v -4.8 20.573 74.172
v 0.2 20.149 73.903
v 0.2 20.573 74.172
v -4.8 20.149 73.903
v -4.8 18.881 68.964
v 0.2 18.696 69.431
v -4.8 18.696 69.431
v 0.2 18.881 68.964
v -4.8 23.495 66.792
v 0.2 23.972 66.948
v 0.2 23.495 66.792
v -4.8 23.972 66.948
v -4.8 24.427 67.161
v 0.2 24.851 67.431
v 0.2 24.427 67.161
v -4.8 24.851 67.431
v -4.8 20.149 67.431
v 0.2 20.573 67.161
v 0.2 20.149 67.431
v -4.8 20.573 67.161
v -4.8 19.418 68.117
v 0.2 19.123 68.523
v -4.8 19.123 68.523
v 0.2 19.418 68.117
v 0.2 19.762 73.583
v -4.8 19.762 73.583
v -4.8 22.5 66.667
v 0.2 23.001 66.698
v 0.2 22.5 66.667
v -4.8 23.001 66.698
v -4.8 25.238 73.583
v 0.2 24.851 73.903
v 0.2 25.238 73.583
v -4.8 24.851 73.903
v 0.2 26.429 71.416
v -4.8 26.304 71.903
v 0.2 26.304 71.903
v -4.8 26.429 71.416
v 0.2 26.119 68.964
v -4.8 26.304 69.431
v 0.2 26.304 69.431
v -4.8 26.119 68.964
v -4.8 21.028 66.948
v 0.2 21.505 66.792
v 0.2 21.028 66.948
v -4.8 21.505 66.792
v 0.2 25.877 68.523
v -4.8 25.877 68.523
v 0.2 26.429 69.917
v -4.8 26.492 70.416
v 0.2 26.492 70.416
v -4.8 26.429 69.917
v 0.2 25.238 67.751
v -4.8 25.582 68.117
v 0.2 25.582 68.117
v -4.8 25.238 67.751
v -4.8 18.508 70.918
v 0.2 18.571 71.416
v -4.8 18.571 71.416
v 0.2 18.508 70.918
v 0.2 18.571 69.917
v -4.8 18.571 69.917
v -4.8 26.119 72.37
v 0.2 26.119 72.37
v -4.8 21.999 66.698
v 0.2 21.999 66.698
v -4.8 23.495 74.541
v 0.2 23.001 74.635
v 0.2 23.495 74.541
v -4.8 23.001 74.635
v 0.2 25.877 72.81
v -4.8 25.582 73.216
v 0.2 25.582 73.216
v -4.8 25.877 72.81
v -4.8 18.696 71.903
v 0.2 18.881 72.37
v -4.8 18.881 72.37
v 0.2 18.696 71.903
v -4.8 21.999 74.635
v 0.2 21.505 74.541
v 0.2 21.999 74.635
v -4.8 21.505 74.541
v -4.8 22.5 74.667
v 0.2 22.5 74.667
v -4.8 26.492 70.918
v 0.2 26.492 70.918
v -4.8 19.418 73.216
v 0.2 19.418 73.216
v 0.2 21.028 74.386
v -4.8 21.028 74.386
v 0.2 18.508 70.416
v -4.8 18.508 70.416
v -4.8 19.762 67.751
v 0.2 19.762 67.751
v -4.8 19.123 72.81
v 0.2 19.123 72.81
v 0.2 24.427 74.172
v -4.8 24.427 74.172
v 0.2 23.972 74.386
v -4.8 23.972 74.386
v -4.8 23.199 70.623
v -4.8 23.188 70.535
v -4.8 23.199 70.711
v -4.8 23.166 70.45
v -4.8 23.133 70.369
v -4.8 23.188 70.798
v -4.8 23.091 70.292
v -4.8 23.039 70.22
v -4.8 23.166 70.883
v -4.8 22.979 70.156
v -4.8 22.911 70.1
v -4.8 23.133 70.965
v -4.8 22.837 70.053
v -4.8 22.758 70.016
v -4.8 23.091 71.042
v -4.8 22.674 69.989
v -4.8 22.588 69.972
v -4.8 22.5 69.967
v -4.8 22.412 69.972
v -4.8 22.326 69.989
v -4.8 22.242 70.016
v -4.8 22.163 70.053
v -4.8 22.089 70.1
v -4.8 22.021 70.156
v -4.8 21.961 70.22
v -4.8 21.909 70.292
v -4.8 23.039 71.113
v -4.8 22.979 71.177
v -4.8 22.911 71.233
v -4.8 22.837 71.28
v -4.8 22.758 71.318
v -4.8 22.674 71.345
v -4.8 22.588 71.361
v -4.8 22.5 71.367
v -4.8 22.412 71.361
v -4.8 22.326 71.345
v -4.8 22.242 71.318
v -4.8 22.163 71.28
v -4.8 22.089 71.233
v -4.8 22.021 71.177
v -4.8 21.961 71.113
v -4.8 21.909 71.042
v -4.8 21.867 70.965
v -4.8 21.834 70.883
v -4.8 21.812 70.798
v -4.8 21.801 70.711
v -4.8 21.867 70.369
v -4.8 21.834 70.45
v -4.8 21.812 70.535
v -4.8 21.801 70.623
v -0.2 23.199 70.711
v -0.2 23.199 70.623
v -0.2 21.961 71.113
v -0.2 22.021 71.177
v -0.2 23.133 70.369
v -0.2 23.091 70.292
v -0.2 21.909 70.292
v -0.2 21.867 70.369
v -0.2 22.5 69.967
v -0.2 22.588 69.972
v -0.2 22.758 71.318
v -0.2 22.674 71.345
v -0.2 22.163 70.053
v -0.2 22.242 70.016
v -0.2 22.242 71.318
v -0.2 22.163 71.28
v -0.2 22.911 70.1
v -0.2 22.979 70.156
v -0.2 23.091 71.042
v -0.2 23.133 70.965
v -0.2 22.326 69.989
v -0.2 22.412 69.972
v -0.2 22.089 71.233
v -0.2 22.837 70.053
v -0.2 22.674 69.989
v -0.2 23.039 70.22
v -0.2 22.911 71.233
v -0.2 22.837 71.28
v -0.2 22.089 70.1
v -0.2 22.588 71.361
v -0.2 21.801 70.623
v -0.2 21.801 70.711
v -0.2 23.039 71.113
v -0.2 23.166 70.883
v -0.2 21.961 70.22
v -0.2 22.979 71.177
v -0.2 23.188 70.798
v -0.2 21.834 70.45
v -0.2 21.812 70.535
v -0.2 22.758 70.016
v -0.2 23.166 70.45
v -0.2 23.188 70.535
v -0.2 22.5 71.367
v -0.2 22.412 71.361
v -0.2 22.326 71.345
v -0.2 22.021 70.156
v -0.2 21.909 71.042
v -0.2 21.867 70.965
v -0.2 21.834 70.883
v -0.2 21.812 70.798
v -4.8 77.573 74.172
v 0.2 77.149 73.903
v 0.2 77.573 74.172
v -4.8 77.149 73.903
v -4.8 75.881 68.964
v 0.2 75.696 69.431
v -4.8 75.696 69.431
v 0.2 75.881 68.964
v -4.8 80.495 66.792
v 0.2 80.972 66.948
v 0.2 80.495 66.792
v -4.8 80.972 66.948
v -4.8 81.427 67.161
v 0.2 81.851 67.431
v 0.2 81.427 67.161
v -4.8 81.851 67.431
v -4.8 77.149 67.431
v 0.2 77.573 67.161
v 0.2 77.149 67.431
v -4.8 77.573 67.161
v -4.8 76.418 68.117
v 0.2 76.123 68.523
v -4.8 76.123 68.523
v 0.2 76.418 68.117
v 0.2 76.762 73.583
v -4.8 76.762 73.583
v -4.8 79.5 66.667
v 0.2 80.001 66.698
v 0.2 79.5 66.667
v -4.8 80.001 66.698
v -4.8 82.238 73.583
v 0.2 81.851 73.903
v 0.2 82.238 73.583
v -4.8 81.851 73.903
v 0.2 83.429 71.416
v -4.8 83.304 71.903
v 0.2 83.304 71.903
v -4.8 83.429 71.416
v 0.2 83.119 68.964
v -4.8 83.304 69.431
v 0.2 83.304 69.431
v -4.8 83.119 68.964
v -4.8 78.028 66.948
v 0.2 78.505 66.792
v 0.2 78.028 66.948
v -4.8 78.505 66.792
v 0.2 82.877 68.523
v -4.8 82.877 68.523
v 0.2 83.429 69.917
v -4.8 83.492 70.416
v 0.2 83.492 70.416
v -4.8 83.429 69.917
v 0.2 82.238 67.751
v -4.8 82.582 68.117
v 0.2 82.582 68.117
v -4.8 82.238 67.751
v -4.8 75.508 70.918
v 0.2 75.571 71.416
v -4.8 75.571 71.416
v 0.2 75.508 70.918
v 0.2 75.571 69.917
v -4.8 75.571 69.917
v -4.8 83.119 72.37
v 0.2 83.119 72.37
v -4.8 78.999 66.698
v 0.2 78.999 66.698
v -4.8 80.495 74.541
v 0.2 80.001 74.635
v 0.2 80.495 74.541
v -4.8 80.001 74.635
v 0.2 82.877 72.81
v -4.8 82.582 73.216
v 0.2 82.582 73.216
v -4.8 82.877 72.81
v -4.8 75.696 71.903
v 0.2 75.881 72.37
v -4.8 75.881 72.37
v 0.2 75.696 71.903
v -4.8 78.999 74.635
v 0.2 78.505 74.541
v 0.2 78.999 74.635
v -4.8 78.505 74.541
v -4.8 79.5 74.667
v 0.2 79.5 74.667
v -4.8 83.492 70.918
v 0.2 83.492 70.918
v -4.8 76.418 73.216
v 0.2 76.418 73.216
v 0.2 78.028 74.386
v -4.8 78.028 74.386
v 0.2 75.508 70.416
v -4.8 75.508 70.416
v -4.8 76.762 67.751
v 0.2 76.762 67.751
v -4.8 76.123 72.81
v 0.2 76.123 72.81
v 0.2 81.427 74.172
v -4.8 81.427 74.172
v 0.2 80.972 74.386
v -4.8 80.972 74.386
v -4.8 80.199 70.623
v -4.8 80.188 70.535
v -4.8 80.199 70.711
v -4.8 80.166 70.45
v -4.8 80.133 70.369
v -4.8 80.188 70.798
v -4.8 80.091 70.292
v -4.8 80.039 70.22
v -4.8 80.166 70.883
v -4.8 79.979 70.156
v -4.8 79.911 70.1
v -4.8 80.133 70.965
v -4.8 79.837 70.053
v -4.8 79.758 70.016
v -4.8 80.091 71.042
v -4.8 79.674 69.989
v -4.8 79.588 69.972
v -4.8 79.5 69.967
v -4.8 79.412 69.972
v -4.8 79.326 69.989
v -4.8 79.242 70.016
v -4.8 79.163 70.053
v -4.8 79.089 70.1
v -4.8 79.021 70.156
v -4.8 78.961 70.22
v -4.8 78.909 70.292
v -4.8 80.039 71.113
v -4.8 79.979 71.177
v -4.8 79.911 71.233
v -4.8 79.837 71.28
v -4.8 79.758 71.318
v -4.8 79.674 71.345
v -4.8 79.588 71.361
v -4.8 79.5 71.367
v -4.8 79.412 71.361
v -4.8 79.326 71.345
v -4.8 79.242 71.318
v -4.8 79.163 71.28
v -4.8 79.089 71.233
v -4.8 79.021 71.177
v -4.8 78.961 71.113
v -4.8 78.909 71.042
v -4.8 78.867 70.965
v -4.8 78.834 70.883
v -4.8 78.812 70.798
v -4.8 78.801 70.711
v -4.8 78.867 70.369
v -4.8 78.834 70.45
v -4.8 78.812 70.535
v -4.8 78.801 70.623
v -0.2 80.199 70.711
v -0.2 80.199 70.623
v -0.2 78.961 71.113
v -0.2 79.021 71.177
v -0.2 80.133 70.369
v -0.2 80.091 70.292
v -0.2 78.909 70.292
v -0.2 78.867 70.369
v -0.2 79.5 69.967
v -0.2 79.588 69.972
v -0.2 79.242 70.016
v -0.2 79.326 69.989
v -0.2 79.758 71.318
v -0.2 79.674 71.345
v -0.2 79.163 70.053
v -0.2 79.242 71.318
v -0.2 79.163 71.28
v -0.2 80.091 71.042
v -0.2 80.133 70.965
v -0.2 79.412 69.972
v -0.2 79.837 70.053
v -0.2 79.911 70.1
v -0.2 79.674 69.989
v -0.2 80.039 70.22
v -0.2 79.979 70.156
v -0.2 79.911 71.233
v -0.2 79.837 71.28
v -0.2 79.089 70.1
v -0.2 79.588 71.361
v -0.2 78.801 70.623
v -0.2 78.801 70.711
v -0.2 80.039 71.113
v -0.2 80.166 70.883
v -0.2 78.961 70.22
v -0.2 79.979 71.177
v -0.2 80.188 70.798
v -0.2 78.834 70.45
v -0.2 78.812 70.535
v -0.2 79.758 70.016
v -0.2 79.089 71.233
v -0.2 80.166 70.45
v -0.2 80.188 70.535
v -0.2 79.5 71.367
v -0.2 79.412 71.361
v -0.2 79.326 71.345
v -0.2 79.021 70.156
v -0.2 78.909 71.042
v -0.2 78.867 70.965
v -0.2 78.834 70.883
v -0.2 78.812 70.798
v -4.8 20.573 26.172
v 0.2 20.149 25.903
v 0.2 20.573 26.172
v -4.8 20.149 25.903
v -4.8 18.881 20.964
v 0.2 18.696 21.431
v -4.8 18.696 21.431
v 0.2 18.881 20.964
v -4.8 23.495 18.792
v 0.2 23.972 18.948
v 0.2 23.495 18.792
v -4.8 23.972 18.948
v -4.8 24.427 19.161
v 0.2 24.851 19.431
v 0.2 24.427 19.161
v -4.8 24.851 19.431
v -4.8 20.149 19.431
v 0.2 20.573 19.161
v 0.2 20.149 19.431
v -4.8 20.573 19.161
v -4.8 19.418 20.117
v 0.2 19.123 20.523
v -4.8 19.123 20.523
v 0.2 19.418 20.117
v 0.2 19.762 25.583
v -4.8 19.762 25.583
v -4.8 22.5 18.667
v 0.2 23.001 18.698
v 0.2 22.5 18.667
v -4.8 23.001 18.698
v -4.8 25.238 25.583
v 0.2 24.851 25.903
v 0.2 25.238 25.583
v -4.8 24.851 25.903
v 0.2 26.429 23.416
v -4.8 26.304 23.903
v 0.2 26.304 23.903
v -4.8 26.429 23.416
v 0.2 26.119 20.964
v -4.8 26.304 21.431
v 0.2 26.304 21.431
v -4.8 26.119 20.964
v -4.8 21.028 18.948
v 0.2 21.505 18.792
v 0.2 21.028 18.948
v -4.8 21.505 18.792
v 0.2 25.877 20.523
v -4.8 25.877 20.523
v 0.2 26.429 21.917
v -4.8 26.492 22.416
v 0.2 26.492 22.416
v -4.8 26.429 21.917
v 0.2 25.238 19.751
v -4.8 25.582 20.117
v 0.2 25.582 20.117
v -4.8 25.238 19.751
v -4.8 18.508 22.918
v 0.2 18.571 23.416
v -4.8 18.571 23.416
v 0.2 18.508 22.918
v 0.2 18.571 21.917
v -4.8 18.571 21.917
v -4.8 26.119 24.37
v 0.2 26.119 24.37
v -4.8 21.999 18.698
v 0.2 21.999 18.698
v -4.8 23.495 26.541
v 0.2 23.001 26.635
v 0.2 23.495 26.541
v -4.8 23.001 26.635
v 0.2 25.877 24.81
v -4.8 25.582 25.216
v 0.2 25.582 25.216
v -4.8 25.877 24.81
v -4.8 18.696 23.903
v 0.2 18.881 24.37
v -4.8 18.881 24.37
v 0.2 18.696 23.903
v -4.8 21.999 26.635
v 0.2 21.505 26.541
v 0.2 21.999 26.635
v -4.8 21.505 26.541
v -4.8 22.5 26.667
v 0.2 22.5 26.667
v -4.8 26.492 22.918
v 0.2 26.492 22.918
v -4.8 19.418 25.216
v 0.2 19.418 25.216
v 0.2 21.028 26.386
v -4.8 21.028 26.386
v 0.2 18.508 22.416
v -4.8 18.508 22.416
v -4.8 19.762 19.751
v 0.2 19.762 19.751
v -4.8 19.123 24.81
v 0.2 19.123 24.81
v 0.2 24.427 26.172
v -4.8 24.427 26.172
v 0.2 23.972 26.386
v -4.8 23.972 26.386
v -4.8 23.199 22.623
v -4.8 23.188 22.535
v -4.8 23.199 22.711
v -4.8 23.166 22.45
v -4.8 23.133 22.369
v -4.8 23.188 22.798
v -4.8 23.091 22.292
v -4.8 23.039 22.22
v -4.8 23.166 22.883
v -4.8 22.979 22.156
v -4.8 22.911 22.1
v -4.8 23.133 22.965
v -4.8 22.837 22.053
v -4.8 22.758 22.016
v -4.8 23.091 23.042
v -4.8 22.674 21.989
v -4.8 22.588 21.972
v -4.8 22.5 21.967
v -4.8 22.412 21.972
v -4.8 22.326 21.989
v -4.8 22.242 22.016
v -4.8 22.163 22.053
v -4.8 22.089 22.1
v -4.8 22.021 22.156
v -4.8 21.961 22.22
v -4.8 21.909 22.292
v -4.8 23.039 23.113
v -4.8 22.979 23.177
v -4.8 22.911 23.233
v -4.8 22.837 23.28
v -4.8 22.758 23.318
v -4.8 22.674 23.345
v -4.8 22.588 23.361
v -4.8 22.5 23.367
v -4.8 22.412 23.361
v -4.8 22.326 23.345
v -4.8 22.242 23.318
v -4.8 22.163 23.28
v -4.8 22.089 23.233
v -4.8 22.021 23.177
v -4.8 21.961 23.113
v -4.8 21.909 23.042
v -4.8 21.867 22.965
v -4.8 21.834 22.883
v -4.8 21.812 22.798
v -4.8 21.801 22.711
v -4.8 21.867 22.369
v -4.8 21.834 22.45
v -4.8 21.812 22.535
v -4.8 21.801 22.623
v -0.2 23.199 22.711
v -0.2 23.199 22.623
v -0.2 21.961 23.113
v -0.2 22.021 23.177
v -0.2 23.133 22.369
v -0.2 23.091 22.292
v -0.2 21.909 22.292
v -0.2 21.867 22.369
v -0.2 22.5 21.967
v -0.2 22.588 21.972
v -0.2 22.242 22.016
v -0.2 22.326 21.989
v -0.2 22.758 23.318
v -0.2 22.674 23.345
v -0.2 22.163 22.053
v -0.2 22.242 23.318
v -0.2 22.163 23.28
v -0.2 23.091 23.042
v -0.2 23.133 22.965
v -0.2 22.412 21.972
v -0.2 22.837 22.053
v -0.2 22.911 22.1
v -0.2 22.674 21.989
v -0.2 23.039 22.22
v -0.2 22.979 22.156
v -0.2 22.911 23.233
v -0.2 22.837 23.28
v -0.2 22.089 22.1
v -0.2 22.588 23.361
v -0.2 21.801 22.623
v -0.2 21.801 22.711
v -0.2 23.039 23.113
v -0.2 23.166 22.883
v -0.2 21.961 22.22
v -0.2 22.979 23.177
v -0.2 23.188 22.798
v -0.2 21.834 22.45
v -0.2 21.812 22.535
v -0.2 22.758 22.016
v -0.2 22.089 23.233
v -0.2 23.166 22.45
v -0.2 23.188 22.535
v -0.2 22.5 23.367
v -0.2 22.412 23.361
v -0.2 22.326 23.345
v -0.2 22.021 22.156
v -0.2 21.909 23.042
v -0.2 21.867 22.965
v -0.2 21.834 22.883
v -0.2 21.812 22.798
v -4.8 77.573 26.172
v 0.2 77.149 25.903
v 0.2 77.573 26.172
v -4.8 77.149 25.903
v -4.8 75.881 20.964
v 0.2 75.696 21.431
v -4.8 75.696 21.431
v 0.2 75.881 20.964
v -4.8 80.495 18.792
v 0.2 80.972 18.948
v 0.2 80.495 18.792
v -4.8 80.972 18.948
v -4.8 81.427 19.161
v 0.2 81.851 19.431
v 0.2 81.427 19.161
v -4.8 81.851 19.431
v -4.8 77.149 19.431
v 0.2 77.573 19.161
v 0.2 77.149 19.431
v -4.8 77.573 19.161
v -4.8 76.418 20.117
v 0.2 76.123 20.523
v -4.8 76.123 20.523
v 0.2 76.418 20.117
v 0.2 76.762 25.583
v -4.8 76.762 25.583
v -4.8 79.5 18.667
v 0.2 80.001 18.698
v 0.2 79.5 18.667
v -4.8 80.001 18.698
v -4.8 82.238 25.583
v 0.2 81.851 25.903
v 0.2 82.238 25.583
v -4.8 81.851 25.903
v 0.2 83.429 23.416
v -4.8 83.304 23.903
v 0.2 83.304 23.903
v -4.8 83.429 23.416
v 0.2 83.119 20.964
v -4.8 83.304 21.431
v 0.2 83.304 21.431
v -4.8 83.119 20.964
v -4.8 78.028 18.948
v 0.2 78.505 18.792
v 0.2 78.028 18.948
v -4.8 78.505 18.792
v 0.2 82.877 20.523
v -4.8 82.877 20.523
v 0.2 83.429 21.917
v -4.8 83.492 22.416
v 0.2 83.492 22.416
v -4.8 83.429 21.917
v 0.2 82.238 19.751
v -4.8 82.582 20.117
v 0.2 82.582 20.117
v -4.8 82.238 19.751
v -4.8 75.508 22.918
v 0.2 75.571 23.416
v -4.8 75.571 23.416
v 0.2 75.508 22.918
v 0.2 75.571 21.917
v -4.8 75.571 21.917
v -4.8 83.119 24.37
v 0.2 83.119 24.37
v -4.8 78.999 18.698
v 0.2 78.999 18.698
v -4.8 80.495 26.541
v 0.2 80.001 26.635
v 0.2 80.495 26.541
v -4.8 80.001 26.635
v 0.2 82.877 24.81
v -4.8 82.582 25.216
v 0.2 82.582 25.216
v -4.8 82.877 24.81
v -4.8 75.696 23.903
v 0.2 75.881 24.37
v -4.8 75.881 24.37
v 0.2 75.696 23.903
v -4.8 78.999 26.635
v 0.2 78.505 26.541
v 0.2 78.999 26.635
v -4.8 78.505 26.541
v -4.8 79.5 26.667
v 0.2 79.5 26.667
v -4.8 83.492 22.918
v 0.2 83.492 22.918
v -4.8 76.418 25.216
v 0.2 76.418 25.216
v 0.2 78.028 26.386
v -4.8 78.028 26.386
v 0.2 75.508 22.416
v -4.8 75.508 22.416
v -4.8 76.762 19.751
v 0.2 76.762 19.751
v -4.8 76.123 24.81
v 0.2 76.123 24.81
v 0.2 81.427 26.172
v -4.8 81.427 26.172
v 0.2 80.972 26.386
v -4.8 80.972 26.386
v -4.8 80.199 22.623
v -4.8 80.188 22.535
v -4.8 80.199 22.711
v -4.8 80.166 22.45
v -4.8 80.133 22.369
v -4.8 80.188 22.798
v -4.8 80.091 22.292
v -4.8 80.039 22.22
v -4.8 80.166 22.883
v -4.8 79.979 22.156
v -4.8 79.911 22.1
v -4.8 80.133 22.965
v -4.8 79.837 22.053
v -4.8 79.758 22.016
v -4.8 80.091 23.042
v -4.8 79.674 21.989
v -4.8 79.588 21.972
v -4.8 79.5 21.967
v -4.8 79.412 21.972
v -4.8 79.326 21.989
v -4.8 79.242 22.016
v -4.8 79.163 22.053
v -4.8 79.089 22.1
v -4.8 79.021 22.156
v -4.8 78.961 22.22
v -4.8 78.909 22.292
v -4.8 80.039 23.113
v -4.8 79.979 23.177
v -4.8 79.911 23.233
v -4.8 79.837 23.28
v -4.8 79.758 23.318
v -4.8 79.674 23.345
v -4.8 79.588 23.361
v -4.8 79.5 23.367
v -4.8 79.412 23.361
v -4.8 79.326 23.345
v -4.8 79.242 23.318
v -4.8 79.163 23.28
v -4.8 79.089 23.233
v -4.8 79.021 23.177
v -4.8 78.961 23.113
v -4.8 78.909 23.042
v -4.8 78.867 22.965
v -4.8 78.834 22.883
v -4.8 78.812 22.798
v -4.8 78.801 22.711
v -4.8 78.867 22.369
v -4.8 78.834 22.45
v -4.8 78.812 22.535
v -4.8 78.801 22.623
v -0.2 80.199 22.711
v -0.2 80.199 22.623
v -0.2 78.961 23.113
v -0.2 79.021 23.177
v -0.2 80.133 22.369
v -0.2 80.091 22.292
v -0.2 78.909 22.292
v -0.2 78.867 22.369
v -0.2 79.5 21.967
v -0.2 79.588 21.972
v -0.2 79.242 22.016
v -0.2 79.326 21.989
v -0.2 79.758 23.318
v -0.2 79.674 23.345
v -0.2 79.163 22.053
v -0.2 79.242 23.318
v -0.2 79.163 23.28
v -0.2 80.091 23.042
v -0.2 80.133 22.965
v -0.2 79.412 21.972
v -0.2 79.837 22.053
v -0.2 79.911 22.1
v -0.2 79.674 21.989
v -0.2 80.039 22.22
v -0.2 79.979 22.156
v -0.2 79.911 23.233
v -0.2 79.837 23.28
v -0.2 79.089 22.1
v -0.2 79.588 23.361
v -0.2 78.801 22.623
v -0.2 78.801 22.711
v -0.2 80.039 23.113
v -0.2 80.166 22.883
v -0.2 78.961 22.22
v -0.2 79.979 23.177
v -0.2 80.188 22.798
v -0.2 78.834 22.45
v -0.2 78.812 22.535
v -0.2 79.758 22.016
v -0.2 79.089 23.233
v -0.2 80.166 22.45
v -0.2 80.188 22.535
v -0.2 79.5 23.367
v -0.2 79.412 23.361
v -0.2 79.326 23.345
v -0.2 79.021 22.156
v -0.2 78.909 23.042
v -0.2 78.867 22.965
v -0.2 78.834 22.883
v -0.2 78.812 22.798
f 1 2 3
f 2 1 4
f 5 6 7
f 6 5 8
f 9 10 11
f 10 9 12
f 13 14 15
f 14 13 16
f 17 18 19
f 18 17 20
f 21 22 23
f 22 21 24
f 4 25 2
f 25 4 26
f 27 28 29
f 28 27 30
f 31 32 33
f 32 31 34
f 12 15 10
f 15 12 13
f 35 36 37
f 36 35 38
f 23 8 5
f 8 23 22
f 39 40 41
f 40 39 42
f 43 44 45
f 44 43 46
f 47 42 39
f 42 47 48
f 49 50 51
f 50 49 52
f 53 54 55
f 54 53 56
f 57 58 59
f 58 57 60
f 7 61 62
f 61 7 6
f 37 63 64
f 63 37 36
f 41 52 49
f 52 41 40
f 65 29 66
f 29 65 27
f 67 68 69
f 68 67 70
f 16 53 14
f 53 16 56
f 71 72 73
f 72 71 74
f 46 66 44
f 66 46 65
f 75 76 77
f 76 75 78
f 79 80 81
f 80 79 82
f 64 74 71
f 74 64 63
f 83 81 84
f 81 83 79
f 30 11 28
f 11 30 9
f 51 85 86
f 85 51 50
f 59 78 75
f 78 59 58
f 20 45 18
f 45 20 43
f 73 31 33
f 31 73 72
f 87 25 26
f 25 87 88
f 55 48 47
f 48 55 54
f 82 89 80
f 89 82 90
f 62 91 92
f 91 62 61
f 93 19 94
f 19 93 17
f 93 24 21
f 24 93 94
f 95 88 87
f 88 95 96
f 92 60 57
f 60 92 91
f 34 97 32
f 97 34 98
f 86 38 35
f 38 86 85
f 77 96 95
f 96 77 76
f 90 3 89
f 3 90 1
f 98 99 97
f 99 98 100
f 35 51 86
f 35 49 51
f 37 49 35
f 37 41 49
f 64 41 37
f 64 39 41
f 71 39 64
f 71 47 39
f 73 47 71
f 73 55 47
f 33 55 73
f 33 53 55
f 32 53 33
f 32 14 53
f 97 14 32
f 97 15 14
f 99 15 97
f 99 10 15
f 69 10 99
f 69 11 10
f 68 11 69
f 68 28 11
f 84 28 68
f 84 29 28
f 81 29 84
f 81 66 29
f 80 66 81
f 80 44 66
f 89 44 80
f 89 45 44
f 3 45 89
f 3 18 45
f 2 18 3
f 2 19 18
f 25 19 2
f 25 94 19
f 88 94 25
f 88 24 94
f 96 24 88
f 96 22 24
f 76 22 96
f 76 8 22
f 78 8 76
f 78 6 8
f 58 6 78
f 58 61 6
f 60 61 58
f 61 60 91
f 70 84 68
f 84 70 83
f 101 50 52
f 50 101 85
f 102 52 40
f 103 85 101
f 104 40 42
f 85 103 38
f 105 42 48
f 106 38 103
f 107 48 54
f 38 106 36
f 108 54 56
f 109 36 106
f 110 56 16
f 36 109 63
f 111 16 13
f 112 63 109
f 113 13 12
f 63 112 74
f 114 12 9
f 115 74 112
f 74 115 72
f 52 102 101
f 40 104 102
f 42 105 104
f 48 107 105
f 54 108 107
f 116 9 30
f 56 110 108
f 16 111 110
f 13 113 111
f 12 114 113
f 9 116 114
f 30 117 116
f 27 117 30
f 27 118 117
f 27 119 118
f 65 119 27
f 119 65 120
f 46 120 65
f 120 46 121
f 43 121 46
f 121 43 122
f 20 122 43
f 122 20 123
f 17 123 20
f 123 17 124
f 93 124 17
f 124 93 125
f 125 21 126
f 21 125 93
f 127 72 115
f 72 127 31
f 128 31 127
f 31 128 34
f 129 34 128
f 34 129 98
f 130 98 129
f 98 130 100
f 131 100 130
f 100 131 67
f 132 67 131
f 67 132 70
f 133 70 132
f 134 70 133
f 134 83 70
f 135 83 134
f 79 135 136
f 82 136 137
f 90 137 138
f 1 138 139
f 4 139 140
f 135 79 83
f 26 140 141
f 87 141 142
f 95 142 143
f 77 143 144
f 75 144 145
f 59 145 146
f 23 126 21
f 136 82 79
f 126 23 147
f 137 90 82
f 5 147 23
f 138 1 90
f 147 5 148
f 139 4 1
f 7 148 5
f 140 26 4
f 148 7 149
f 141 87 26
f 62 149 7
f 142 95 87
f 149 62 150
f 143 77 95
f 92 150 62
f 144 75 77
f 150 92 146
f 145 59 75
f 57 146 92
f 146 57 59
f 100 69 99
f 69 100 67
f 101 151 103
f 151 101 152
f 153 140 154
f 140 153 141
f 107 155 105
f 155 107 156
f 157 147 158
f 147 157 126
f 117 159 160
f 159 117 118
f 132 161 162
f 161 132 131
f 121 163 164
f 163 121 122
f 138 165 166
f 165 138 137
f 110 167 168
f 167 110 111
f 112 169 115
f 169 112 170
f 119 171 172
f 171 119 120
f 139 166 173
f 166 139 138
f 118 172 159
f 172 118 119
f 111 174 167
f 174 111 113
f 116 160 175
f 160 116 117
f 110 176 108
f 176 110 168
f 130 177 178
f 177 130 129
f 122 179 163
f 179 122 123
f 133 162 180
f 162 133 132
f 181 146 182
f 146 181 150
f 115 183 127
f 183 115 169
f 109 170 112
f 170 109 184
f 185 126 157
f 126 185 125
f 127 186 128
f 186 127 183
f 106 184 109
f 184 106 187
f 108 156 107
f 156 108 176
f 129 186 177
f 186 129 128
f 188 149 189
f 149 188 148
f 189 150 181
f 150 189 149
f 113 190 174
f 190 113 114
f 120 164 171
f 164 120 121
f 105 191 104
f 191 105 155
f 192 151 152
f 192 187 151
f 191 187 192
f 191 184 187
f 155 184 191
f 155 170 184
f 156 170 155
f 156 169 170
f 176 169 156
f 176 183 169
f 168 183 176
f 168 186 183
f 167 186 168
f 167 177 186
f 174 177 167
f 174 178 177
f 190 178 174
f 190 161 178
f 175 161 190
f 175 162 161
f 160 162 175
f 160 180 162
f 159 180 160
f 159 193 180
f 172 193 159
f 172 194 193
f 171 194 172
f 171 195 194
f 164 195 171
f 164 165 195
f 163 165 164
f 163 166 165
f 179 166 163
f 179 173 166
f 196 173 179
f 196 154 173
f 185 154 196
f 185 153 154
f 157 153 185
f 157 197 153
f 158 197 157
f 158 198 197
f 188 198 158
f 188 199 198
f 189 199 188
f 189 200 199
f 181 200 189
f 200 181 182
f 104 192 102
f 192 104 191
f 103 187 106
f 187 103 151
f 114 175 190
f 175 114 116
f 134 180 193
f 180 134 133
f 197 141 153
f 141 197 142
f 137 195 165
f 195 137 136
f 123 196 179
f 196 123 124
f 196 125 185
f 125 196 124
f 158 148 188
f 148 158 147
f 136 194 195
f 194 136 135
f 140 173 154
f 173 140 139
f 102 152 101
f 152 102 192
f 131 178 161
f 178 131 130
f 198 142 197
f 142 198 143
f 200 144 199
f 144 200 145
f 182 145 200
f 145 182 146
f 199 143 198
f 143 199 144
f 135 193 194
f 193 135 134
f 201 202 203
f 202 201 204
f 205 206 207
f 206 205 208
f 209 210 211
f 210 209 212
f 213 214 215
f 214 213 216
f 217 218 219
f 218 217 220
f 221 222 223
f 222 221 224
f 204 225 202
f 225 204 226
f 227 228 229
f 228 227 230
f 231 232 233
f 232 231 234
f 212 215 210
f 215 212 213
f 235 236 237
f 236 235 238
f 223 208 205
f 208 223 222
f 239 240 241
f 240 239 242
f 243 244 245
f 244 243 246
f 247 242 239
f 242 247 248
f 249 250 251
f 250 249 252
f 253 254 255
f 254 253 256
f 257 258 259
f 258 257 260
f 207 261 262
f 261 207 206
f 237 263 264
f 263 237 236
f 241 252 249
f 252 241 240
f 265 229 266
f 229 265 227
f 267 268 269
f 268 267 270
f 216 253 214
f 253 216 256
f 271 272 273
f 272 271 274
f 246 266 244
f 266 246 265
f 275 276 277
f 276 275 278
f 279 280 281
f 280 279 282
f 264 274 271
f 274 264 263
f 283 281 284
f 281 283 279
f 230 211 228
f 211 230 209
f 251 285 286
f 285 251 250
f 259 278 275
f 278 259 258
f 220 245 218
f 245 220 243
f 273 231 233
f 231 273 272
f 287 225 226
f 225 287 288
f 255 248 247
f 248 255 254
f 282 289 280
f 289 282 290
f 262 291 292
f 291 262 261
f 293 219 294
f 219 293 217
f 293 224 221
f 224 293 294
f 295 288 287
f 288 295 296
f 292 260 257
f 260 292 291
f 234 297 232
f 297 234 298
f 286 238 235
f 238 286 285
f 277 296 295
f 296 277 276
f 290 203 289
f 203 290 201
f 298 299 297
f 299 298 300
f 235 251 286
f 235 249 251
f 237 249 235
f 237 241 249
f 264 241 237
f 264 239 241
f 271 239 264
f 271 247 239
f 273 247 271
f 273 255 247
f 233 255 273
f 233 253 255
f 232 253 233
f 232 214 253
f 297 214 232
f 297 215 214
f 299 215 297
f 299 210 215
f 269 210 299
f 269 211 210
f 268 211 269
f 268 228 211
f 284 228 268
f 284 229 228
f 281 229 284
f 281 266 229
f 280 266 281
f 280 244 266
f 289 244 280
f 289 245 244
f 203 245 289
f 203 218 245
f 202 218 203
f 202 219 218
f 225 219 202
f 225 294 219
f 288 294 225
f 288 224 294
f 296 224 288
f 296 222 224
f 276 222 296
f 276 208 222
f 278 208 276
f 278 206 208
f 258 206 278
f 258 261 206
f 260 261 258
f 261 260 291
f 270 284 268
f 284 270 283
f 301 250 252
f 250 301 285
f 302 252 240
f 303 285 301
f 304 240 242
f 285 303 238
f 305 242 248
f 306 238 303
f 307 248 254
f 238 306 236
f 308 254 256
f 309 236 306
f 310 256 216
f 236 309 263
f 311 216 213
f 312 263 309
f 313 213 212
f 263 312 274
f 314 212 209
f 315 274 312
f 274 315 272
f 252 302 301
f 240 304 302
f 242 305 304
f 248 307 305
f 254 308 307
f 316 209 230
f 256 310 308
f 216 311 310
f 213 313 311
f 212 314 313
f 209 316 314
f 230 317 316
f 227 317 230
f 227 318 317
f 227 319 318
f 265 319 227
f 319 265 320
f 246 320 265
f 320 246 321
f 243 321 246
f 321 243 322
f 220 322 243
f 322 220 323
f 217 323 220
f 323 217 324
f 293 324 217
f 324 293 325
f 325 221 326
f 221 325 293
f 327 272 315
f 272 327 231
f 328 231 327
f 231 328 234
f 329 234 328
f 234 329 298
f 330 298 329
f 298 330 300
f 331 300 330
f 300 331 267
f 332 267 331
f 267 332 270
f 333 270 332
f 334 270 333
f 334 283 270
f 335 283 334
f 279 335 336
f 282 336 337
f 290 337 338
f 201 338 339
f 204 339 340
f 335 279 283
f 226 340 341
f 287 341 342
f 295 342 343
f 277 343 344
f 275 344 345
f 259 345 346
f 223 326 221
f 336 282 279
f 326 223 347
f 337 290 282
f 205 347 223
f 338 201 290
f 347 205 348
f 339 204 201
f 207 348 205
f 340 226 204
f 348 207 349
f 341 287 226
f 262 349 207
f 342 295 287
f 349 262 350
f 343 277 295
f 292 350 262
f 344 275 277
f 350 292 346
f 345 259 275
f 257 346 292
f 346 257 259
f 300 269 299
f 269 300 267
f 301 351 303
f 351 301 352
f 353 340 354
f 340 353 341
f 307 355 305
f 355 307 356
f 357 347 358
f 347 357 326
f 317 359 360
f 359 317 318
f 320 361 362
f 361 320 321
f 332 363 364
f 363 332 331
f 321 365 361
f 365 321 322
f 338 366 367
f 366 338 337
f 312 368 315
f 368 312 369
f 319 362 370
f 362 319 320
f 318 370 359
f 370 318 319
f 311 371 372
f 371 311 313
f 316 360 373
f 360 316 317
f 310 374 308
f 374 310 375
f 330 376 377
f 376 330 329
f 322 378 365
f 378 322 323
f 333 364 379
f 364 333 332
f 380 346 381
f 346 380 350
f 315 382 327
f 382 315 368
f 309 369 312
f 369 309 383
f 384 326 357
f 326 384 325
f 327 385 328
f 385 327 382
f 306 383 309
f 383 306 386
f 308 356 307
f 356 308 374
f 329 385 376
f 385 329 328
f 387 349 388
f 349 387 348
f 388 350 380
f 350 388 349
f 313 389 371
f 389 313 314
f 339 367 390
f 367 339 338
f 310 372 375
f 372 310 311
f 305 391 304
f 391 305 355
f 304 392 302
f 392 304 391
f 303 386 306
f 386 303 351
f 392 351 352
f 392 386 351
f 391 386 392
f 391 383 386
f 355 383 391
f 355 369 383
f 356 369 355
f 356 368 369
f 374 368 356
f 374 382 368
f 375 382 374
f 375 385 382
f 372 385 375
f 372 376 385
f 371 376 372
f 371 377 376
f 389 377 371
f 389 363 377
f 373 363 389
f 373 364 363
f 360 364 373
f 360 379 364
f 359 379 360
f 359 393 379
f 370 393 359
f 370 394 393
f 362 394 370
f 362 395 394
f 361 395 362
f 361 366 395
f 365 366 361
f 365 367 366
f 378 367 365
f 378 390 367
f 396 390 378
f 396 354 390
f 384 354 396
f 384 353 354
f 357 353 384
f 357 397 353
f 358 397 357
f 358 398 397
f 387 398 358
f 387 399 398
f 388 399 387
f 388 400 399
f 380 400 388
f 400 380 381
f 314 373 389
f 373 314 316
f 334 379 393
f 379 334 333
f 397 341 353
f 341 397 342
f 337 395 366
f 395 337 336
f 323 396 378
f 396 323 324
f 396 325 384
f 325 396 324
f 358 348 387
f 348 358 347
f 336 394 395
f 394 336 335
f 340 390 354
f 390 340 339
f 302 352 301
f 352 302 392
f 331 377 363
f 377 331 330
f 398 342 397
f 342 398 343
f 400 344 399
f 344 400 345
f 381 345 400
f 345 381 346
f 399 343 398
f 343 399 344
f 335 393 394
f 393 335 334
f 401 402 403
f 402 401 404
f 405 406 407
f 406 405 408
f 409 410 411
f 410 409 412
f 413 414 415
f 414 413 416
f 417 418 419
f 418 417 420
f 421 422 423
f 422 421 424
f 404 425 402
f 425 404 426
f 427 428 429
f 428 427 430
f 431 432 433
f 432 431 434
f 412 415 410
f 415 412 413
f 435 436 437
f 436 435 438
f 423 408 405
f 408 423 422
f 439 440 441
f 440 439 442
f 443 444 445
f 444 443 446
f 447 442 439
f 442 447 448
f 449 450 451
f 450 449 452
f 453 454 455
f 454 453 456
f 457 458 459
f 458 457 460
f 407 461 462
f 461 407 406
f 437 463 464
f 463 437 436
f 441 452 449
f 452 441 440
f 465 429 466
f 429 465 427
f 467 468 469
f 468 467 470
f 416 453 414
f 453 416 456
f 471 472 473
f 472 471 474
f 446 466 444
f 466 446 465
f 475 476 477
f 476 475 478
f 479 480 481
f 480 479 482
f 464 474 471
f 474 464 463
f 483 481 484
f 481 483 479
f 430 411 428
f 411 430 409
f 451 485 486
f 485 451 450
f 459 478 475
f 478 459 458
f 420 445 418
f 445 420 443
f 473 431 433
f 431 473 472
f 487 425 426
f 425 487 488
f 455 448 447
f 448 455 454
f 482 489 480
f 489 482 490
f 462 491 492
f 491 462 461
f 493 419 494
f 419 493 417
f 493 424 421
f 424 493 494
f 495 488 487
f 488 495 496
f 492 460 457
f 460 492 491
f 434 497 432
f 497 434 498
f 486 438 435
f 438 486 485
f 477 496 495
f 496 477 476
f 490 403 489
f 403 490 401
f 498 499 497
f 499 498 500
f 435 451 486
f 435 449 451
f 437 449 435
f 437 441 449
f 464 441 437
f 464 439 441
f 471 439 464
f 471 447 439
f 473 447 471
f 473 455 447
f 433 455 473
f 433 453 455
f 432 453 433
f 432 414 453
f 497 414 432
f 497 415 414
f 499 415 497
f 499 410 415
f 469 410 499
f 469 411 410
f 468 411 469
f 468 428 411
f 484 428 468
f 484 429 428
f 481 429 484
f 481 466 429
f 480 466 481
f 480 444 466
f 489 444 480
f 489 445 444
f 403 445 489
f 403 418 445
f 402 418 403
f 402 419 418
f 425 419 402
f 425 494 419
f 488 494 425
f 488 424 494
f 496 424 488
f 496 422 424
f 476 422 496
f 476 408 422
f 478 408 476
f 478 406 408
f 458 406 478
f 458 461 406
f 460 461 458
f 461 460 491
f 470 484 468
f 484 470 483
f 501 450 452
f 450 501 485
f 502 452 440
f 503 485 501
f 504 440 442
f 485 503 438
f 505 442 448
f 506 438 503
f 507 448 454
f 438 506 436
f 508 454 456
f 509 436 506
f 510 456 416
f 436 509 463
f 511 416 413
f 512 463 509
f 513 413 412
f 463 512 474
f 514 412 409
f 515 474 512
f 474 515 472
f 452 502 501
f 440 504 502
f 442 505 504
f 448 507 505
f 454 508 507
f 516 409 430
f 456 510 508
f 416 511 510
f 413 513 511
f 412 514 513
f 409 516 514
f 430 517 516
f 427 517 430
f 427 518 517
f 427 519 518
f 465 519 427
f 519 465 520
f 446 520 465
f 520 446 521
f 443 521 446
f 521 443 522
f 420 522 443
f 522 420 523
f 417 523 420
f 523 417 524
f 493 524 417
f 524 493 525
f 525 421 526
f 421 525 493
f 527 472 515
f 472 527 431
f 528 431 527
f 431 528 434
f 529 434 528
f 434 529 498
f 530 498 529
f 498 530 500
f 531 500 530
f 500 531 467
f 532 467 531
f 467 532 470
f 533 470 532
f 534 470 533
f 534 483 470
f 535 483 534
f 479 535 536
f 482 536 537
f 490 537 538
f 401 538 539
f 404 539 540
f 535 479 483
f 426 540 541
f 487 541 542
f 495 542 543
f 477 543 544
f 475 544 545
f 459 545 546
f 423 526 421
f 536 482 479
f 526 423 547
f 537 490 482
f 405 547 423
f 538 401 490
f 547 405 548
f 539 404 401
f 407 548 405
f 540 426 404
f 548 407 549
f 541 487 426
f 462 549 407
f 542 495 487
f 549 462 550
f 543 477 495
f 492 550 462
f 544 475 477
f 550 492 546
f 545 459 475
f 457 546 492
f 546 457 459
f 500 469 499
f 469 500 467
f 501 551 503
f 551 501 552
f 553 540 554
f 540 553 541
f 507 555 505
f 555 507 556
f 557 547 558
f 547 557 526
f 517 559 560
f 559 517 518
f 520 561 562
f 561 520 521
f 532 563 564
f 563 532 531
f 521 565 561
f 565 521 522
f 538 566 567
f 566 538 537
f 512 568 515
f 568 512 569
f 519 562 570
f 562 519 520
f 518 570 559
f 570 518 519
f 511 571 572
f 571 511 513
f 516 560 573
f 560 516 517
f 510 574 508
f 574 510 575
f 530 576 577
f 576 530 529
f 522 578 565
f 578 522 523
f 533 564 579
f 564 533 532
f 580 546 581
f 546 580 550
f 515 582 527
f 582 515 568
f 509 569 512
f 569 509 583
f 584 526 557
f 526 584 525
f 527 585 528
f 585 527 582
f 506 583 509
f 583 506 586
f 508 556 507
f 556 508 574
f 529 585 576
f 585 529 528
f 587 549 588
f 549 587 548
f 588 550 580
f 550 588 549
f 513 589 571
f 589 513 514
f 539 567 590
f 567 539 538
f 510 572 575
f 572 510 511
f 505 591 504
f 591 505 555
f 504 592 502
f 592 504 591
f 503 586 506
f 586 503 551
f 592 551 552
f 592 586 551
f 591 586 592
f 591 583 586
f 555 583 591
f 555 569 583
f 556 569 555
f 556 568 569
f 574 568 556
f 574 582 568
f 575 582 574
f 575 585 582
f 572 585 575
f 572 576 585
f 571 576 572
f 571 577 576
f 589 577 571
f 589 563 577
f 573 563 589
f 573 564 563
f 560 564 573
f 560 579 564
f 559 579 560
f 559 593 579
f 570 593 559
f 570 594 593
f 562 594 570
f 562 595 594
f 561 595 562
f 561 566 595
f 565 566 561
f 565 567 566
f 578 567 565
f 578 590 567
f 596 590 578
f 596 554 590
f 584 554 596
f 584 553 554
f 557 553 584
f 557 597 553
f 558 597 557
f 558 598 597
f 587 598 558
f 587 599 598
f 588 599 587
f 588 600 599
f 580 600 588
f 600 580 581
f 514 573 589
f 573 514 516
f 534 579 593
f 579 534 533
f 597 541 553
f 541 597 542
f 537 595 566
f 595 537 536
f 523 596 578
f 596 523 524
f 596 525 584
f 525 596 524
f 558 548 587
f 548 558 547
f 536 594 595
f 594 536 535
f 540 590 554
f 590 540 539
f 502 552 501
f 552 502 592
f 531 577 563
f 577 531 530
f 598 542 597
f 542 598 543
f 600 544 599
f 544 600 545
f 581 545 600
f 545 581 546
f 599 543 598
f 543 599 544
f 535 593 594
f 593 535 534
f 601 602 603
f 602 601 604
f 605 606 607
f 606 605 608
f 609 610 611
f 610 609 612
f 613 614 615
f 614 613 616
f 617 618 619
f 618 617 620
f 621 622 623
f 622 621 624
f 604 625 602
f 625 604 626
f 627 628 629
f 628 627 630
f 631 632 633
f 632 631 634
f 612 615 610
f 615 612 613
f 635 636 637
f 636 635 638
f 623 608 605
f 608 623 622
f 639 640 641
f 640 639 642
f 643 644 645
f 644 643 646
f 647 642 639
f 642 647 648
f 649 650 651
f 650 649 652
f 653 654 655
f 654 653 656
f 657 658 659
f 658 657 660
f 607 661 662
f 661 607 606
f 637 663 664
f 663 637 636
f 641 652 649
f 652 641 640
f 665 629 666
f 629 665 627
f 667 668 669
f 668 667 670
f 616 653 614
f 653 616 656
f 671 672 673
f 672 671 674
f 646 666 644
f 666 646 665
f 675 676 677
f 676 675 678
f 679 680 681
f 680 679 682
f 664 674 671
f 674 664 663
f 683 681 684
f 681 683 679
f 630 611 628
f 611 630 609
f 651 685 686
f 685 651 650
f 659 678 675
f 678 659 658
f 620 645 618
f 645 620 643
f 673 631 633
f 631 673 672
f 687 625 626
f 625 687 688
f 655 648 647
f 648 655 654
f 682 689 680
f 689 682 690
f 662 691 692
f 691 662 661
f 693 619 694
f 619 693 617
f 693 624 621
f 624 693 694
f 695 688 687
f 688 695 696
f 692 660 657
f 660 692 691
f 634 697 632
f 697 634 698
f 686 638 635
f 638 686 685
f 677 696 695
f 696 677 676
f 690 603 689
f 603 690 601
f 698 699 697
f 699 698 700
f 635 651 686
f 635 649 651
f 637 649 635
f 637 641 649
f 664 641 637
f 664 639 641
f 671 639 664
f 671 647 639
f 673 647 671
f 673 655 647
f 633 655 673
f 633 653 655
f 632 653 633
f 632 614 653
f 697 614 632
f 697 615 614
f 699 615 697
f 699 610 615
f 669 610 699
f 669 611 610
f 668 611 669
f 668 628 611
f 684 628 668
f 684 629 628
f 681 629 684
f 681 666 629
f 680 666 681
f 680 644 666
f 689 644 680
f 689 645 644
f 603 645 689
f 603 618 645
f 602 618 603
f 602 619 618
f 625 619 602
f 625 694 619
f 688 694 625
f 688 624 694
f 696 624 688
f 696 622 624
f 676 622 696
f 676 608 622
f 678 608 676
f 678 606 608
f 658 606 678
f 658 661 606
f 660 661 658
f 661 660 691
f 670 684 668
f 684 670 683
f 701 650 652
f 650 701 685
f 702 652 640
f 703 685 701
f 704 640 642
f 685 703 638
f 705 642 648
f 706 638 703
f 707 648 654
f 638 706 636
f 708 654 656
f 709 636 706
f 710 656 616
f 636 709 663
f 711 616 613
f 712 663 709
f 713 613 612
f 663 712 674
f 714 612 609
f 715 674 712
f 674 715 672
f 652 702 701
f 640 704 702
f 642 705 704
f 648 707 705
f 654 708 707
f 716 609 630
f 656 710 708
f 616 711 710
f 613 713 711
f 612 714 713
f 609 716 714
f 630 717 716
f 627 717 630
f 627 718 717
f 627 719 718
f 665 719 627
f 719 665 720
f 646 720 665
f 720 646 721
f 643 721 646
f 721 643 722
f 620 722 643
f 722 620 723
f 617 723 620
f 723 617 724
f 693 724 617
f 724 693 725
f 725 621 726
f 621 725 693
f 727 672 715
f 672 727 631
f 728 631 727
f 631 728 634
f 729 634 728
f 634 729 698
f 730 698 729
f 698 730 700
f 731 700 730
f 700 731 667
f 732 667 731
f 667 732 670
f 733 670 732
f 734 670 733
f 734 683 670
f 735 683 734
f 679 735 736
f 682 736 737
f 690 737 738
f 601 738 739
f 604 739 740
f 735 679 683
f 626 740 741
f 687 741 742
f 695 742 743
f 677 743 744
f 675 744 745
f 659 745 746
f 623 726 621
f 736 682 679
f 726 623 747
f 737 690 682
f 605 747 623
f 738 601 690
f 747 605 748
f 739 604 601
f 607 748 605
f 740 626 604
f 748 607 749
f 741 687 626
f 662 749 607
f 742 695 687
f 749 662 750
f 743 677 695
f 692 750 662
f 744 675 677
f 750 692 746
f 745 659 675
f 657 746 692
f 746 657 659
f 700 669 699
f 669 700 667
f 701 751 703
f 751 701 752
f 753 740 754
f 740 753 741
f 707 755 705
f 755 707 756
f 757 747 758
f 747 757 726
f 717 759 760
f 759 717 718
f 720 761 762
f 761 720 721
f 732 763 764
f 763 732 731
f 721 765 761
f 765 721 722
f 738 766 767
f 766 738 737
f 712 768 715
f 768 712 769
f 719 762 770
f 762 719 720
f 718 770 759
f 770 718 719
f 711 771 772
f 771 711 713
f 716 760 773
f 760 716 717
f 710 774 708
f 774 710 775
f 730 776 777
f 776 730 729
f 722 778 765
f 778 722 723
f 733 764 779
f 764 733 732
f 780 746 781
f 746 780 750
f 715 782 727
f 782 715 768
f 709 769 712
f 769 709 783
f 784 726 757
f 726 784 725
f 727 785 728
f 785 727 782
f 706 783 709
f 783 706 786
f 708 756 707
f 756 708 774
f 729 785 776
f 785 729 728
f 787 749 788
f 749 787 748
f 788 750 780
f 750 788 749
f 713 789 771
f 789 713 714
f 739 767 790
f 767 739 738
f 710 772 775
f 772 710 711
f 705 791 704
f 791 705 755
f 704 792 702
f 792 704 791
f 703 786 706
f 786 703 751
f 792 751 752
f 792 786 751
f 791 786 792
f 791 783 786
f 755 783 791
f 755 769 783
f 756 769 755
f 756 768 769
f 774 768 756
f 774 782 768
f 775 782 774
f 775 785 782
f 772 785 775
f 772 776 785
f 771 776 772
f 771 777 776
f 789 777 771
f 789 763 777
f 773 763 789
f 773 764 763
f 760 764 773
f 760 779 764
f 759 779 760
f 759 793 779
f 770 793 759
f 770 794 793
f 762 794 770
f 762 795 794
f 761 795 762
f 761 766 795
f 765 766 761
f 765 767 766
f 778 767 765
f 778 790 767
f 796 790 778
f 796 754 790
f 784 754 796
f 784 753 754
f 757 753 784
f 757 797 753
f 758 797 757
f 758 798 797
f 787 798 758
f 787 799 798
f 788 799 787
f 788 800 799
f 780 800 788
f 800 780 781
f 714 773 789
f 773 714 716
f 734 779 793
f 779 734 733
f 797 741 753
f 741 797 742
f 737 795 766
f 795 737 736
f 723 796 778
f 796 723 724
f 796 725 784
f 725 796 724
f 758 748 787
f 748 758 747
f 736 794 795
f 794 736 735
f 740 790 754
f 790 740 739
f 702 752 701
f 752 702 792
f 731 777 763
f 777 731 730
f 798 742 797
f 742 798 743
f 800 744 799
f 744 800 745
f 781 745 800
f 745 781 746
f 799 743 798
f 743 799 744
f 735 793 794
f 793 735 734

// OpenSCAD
// file: ../robot_settings.scad
main_box_x = 95; // 96
main_box_y = 102;
main_box_z = 74; // 74.5
wall_thickness = 2;

rail_gap = 2;
rail_inset = 7;

rail_thickness = 7;
rail_length = 250;
rail_width = 200;

raspberry_pi_screw_seperation_y = 57;
raspberry_pi_screw_seperation_z = 48;
raspberry_pi_peg_h = 5;

gears_module = 1;
pinion_gear_teeth = 30;
pinion_gear_width = 5;
pinion_gear_bore = 4;

gears_setback_distance = 25;
gear_post_height = 2 * pinion_gear_width + rail_thickness + 8 ;

steering_motor_mount_x = 45;
steering_motor_mount_y = 36;
steering_motor_mount_z = 18;
steering_motor_mount_setback_distance = gears_setback_distance + 16;

dc_motor_drivertype = "Teyleten"; // Teyleten
isAdafruit = (dc_motor_drivertype == "Adafruit");

drv8871_x = isAdafruit ? 20.3 : 21.6;
drv8871_y = isAdafruit ?  24 : 25;

drv8871_z = 2;
drv8871_screw_d = 2.5;
drv8871_solder_points_z = 2;

drv8871mount_edge_x = 1.5;
drv8871mount_edge_wall = 3;
drv8871mount_z = 5;
drv8871mount_x = drv8871_x +  drv8871mount_edge_wall - 2* drv8871mount_edge_x;
drv8871mount_y = 19;

drv8871_screw_distance = 15.64;
drv8871_solder_points_d = 1.66;
drv8871_solder_offset_y = 4.4;
drv8871_solder_inner_points_distance = 5;
drv8871_solder_outer_points_distance = 12;

dc_motor_housing_minus_encoder_z = 48;
dc_motor_encoder_z = 9.33;
dc_motor_encoder_wheel_d = 13.4;
dc_motor_encoder_wheel_thickness = 5;
dc_motor_encoder_wheel_gap = 3;
dc_motor_encoder_circuit_thickness = 2;
dc_motor_cutout_d = 24.8;
dc_motor_cutout_z = 19.5;

dc_motor_screw_head_z = 2;
dc_motor_screw_head_d = 5.6;
dc_motor_screw_d = 3.2;
dc_motor_screw_offset = 8.5;

dc_motor_axle_ring_z = 3;
dc_motor_axle_ring_d = 7.2;
dc_motor_axle_cutout_d = 4.5;
dc_motor_axle_cutout_z = 10;
dc_motor_axle_notch_cutout = 0.4;
dc_motor_axle_notch_cutout_z = 6;

pdmount_x = 20;
pdmount_y = 30;
pdmount_z = 2;
pdmount_edge_x = 1.5;
pdmount_edge_wall = 3;

steering_shaft_z = 45;
steering_shaft_d = 7;
steering_shaft_motor_fitting_d = 9;
coupler_length = 24.6;
coupler_diameter = 14;
coupler_screw_d = 4;
coupler_screw_z_offset = 5;
coupler_gear_side_insert = 12.6;
steering_shaft_with_coupler_z = steering_shaft_z - coupler_gear_side_insert;

lidar_mount_y = 110;
lidar_mount_x = 65 + 20;
lidar_narrow_screws = 40;
lidar_wide_screws = 56;
lidar_front_to_back_screws = 70;
lidar_screw_d = 3;
lidar_circuitboard_x = 20;
lidar_circuitboard_y = 35;
lidar_circuitboard_z = 1.2;
lidar_cord_length = 29;

ball_bearing_height = 7;
ball_bearing_outer_diameter = 22;
ball_bearing_inner_diameter = 8;

 armature_holder_height = 20;
 armature_holder_thickness = 8;
pull_bar_peg_r = 3.2;
apparatus_locking_peg_d = 4;

rack_module = 1;
rack_length = main_box_x / 2;
rack_height = 10;
rack_width = 10;
rack_teeth = 30;
rack_bore = 3;

pull_bar_length = rail_width / 2 - rack_length + 1;

// tire hardware
axle_length = 30;
axle_reciever_inner_diameter = 7.75;
axle_reciever_length = 18.8;
axle_notch_length = 7;
axle_notch_cutout = 2.4;

// power distribution bar
power_bar_cutout_x = 96;
power_bar_y = 19.1;
power_bar_z = 1.5;
power_bar_screw_distance = 91.4;
power_bar_screw_d = 2.8;
power_bar_standoff_z = 5;
power_bar_standoff_d = 6.83;

// breadboard
breadboard_wall_thickness = 3;
breadboard_width = 55;
breadboard_length = 83;
breadboard_height = 10.5;
breadboard_notch_width = 3.8;
breadboard_longside_notch_separation = 58.2 - breadboard_notch_width / 2;
breadboard_shortside_notch_separation = 26.3 - breadboard_notch_width;

pico_expander_width = 63;
pico_expander_height = 57;
pico_screw_hole_offset = 3;
pico_screw_hole_d = 2.5;

usbhub_thickness = 11.7;
usbhub_depth = 37.5;
usbhub_width = 86.7;
usbhub_end_port_width = 14.8;
usbhub_front_face_safe_zone_left = 10;
usbhub_front_face_safe_zone_right = 14.8;

switch_w = 16;
switch_cutout_d = 12.2;
switch_bump_h = 2;
switch_bump_l = 18.2;
// main file
include <../robot_settings.scad>
$fn = 50;

module RP5() {

 difference() {
    translate([
              -raspberry_pi_peg_h + .2, 
              main_box_y / 2 - raspberry_pi_screw_seperation_y / 2, 
              main_box_z / 2 - main_box_z /6 + main_box_z / 2 + 9])
    rotate([0,90,0])
    cylinder(h = raspberry_pi_peg_h, d = ball_bearing_inner_diameter);
    
    // screw hole
    translate([
              -raspberry_pi_peg_h - .2, 
              main_box_y / 2 - raspberry_pi_screw_seperation_y / 2, 
              main_box_z / 2 - main_box_z /6 + main_box_z / 2 + 9])
    rotate([0,90,0])
    cylinder(h = raspberry_pi_peg_h, d = power_bar_screw_d / 2);
  }

  // rp5 mounting pegs - top left
  difference() {
    translate([
              -raspberry_pi_peg_h + .2,
              main_box_y / 2 + raspberry_pi_screw_seperation_y / 2, 
              main_box_z / 2 - main_box_z /6 + main_box_z / 2 + 9])
    rotate([0,90,0])
    cylinder(h = raspberry_pi_peg_h, d = ball_bearing_inner_diameter);

    // screw hole
    translate([
              -raspberry_pi_peg_h - .2,
              main_box_y / 2 + raspberry_pi_screw_seperation_y / 2, 
              main_box_z / 2 - main_box_z /6 + main_box_z / 2 + 9])
    rotate([0,90,0])
    cylinder(h = raspberry_pi_peg_h, d = power_bar_screw_d / 2);
  }

  // rp5 mounting pegs - bottom right
  // rp5 mounting pegs - top right
  difference() {
    translate([
              -raspberry_pi_peg_h + .2, 
              main_box_y / 2 - raspberry_pi_screw_seperation_y / 2, 
              main_box_z / 2 - main_box_z /6 + main_box_z / 2 - raspberry_pi_screw_seperation_z + 9])
    rotate([0,90,0])
    cylinder(h = raspberry_pi_peg_h, d = ball_bearing_inner_diameter);
    
    // screw hole
    translate([
              -raspberry_pi_peg_h - .2, 
              main_box_y / 2 - raspberry_pi_screw_seperation_y / 2, 
              main_box_z / 2 - main_box_z /6 + main_box_z / 2 - raspberry_pi_screw_seperation_z + 9])
    rotate([0,90,0])
  cylinder(h = raspberry_pi_peg_h, d = power_bar_screw_d / 2);  
  }

  // rp5 mounting pegs - bottom left
  difference() {
  translate([
            -raspberry_pi_peg_h + .2,
            main_box_y / 2 + raspberry_pi_screw_seperation_y / 2, 
            main_box_z / 2 - main_box_z /6 + main_box_z / 2 -raspberry_pi_screw_seperation_z + 9])
  rotate([0,90,0])
  cylinder(h = raspberry_pi_peg_h, d = ball_bearing_inner_diameter);

  translate([
            -raspberry_pi_peg_h - .2,
            main_box_y / 2 + raspberry_pi_screw_seperation_y / 2, 
            main_box_z / 2 - main_box_z /6 + main_box_z / 2 -raspberry_pi_screw_seperation_z + 9])
  rotate([0,90,0])
  cylinder(h = raspberry_pi_peg_h, d = power_bar_screw_d / 2);
  }
}
RP5();
  
